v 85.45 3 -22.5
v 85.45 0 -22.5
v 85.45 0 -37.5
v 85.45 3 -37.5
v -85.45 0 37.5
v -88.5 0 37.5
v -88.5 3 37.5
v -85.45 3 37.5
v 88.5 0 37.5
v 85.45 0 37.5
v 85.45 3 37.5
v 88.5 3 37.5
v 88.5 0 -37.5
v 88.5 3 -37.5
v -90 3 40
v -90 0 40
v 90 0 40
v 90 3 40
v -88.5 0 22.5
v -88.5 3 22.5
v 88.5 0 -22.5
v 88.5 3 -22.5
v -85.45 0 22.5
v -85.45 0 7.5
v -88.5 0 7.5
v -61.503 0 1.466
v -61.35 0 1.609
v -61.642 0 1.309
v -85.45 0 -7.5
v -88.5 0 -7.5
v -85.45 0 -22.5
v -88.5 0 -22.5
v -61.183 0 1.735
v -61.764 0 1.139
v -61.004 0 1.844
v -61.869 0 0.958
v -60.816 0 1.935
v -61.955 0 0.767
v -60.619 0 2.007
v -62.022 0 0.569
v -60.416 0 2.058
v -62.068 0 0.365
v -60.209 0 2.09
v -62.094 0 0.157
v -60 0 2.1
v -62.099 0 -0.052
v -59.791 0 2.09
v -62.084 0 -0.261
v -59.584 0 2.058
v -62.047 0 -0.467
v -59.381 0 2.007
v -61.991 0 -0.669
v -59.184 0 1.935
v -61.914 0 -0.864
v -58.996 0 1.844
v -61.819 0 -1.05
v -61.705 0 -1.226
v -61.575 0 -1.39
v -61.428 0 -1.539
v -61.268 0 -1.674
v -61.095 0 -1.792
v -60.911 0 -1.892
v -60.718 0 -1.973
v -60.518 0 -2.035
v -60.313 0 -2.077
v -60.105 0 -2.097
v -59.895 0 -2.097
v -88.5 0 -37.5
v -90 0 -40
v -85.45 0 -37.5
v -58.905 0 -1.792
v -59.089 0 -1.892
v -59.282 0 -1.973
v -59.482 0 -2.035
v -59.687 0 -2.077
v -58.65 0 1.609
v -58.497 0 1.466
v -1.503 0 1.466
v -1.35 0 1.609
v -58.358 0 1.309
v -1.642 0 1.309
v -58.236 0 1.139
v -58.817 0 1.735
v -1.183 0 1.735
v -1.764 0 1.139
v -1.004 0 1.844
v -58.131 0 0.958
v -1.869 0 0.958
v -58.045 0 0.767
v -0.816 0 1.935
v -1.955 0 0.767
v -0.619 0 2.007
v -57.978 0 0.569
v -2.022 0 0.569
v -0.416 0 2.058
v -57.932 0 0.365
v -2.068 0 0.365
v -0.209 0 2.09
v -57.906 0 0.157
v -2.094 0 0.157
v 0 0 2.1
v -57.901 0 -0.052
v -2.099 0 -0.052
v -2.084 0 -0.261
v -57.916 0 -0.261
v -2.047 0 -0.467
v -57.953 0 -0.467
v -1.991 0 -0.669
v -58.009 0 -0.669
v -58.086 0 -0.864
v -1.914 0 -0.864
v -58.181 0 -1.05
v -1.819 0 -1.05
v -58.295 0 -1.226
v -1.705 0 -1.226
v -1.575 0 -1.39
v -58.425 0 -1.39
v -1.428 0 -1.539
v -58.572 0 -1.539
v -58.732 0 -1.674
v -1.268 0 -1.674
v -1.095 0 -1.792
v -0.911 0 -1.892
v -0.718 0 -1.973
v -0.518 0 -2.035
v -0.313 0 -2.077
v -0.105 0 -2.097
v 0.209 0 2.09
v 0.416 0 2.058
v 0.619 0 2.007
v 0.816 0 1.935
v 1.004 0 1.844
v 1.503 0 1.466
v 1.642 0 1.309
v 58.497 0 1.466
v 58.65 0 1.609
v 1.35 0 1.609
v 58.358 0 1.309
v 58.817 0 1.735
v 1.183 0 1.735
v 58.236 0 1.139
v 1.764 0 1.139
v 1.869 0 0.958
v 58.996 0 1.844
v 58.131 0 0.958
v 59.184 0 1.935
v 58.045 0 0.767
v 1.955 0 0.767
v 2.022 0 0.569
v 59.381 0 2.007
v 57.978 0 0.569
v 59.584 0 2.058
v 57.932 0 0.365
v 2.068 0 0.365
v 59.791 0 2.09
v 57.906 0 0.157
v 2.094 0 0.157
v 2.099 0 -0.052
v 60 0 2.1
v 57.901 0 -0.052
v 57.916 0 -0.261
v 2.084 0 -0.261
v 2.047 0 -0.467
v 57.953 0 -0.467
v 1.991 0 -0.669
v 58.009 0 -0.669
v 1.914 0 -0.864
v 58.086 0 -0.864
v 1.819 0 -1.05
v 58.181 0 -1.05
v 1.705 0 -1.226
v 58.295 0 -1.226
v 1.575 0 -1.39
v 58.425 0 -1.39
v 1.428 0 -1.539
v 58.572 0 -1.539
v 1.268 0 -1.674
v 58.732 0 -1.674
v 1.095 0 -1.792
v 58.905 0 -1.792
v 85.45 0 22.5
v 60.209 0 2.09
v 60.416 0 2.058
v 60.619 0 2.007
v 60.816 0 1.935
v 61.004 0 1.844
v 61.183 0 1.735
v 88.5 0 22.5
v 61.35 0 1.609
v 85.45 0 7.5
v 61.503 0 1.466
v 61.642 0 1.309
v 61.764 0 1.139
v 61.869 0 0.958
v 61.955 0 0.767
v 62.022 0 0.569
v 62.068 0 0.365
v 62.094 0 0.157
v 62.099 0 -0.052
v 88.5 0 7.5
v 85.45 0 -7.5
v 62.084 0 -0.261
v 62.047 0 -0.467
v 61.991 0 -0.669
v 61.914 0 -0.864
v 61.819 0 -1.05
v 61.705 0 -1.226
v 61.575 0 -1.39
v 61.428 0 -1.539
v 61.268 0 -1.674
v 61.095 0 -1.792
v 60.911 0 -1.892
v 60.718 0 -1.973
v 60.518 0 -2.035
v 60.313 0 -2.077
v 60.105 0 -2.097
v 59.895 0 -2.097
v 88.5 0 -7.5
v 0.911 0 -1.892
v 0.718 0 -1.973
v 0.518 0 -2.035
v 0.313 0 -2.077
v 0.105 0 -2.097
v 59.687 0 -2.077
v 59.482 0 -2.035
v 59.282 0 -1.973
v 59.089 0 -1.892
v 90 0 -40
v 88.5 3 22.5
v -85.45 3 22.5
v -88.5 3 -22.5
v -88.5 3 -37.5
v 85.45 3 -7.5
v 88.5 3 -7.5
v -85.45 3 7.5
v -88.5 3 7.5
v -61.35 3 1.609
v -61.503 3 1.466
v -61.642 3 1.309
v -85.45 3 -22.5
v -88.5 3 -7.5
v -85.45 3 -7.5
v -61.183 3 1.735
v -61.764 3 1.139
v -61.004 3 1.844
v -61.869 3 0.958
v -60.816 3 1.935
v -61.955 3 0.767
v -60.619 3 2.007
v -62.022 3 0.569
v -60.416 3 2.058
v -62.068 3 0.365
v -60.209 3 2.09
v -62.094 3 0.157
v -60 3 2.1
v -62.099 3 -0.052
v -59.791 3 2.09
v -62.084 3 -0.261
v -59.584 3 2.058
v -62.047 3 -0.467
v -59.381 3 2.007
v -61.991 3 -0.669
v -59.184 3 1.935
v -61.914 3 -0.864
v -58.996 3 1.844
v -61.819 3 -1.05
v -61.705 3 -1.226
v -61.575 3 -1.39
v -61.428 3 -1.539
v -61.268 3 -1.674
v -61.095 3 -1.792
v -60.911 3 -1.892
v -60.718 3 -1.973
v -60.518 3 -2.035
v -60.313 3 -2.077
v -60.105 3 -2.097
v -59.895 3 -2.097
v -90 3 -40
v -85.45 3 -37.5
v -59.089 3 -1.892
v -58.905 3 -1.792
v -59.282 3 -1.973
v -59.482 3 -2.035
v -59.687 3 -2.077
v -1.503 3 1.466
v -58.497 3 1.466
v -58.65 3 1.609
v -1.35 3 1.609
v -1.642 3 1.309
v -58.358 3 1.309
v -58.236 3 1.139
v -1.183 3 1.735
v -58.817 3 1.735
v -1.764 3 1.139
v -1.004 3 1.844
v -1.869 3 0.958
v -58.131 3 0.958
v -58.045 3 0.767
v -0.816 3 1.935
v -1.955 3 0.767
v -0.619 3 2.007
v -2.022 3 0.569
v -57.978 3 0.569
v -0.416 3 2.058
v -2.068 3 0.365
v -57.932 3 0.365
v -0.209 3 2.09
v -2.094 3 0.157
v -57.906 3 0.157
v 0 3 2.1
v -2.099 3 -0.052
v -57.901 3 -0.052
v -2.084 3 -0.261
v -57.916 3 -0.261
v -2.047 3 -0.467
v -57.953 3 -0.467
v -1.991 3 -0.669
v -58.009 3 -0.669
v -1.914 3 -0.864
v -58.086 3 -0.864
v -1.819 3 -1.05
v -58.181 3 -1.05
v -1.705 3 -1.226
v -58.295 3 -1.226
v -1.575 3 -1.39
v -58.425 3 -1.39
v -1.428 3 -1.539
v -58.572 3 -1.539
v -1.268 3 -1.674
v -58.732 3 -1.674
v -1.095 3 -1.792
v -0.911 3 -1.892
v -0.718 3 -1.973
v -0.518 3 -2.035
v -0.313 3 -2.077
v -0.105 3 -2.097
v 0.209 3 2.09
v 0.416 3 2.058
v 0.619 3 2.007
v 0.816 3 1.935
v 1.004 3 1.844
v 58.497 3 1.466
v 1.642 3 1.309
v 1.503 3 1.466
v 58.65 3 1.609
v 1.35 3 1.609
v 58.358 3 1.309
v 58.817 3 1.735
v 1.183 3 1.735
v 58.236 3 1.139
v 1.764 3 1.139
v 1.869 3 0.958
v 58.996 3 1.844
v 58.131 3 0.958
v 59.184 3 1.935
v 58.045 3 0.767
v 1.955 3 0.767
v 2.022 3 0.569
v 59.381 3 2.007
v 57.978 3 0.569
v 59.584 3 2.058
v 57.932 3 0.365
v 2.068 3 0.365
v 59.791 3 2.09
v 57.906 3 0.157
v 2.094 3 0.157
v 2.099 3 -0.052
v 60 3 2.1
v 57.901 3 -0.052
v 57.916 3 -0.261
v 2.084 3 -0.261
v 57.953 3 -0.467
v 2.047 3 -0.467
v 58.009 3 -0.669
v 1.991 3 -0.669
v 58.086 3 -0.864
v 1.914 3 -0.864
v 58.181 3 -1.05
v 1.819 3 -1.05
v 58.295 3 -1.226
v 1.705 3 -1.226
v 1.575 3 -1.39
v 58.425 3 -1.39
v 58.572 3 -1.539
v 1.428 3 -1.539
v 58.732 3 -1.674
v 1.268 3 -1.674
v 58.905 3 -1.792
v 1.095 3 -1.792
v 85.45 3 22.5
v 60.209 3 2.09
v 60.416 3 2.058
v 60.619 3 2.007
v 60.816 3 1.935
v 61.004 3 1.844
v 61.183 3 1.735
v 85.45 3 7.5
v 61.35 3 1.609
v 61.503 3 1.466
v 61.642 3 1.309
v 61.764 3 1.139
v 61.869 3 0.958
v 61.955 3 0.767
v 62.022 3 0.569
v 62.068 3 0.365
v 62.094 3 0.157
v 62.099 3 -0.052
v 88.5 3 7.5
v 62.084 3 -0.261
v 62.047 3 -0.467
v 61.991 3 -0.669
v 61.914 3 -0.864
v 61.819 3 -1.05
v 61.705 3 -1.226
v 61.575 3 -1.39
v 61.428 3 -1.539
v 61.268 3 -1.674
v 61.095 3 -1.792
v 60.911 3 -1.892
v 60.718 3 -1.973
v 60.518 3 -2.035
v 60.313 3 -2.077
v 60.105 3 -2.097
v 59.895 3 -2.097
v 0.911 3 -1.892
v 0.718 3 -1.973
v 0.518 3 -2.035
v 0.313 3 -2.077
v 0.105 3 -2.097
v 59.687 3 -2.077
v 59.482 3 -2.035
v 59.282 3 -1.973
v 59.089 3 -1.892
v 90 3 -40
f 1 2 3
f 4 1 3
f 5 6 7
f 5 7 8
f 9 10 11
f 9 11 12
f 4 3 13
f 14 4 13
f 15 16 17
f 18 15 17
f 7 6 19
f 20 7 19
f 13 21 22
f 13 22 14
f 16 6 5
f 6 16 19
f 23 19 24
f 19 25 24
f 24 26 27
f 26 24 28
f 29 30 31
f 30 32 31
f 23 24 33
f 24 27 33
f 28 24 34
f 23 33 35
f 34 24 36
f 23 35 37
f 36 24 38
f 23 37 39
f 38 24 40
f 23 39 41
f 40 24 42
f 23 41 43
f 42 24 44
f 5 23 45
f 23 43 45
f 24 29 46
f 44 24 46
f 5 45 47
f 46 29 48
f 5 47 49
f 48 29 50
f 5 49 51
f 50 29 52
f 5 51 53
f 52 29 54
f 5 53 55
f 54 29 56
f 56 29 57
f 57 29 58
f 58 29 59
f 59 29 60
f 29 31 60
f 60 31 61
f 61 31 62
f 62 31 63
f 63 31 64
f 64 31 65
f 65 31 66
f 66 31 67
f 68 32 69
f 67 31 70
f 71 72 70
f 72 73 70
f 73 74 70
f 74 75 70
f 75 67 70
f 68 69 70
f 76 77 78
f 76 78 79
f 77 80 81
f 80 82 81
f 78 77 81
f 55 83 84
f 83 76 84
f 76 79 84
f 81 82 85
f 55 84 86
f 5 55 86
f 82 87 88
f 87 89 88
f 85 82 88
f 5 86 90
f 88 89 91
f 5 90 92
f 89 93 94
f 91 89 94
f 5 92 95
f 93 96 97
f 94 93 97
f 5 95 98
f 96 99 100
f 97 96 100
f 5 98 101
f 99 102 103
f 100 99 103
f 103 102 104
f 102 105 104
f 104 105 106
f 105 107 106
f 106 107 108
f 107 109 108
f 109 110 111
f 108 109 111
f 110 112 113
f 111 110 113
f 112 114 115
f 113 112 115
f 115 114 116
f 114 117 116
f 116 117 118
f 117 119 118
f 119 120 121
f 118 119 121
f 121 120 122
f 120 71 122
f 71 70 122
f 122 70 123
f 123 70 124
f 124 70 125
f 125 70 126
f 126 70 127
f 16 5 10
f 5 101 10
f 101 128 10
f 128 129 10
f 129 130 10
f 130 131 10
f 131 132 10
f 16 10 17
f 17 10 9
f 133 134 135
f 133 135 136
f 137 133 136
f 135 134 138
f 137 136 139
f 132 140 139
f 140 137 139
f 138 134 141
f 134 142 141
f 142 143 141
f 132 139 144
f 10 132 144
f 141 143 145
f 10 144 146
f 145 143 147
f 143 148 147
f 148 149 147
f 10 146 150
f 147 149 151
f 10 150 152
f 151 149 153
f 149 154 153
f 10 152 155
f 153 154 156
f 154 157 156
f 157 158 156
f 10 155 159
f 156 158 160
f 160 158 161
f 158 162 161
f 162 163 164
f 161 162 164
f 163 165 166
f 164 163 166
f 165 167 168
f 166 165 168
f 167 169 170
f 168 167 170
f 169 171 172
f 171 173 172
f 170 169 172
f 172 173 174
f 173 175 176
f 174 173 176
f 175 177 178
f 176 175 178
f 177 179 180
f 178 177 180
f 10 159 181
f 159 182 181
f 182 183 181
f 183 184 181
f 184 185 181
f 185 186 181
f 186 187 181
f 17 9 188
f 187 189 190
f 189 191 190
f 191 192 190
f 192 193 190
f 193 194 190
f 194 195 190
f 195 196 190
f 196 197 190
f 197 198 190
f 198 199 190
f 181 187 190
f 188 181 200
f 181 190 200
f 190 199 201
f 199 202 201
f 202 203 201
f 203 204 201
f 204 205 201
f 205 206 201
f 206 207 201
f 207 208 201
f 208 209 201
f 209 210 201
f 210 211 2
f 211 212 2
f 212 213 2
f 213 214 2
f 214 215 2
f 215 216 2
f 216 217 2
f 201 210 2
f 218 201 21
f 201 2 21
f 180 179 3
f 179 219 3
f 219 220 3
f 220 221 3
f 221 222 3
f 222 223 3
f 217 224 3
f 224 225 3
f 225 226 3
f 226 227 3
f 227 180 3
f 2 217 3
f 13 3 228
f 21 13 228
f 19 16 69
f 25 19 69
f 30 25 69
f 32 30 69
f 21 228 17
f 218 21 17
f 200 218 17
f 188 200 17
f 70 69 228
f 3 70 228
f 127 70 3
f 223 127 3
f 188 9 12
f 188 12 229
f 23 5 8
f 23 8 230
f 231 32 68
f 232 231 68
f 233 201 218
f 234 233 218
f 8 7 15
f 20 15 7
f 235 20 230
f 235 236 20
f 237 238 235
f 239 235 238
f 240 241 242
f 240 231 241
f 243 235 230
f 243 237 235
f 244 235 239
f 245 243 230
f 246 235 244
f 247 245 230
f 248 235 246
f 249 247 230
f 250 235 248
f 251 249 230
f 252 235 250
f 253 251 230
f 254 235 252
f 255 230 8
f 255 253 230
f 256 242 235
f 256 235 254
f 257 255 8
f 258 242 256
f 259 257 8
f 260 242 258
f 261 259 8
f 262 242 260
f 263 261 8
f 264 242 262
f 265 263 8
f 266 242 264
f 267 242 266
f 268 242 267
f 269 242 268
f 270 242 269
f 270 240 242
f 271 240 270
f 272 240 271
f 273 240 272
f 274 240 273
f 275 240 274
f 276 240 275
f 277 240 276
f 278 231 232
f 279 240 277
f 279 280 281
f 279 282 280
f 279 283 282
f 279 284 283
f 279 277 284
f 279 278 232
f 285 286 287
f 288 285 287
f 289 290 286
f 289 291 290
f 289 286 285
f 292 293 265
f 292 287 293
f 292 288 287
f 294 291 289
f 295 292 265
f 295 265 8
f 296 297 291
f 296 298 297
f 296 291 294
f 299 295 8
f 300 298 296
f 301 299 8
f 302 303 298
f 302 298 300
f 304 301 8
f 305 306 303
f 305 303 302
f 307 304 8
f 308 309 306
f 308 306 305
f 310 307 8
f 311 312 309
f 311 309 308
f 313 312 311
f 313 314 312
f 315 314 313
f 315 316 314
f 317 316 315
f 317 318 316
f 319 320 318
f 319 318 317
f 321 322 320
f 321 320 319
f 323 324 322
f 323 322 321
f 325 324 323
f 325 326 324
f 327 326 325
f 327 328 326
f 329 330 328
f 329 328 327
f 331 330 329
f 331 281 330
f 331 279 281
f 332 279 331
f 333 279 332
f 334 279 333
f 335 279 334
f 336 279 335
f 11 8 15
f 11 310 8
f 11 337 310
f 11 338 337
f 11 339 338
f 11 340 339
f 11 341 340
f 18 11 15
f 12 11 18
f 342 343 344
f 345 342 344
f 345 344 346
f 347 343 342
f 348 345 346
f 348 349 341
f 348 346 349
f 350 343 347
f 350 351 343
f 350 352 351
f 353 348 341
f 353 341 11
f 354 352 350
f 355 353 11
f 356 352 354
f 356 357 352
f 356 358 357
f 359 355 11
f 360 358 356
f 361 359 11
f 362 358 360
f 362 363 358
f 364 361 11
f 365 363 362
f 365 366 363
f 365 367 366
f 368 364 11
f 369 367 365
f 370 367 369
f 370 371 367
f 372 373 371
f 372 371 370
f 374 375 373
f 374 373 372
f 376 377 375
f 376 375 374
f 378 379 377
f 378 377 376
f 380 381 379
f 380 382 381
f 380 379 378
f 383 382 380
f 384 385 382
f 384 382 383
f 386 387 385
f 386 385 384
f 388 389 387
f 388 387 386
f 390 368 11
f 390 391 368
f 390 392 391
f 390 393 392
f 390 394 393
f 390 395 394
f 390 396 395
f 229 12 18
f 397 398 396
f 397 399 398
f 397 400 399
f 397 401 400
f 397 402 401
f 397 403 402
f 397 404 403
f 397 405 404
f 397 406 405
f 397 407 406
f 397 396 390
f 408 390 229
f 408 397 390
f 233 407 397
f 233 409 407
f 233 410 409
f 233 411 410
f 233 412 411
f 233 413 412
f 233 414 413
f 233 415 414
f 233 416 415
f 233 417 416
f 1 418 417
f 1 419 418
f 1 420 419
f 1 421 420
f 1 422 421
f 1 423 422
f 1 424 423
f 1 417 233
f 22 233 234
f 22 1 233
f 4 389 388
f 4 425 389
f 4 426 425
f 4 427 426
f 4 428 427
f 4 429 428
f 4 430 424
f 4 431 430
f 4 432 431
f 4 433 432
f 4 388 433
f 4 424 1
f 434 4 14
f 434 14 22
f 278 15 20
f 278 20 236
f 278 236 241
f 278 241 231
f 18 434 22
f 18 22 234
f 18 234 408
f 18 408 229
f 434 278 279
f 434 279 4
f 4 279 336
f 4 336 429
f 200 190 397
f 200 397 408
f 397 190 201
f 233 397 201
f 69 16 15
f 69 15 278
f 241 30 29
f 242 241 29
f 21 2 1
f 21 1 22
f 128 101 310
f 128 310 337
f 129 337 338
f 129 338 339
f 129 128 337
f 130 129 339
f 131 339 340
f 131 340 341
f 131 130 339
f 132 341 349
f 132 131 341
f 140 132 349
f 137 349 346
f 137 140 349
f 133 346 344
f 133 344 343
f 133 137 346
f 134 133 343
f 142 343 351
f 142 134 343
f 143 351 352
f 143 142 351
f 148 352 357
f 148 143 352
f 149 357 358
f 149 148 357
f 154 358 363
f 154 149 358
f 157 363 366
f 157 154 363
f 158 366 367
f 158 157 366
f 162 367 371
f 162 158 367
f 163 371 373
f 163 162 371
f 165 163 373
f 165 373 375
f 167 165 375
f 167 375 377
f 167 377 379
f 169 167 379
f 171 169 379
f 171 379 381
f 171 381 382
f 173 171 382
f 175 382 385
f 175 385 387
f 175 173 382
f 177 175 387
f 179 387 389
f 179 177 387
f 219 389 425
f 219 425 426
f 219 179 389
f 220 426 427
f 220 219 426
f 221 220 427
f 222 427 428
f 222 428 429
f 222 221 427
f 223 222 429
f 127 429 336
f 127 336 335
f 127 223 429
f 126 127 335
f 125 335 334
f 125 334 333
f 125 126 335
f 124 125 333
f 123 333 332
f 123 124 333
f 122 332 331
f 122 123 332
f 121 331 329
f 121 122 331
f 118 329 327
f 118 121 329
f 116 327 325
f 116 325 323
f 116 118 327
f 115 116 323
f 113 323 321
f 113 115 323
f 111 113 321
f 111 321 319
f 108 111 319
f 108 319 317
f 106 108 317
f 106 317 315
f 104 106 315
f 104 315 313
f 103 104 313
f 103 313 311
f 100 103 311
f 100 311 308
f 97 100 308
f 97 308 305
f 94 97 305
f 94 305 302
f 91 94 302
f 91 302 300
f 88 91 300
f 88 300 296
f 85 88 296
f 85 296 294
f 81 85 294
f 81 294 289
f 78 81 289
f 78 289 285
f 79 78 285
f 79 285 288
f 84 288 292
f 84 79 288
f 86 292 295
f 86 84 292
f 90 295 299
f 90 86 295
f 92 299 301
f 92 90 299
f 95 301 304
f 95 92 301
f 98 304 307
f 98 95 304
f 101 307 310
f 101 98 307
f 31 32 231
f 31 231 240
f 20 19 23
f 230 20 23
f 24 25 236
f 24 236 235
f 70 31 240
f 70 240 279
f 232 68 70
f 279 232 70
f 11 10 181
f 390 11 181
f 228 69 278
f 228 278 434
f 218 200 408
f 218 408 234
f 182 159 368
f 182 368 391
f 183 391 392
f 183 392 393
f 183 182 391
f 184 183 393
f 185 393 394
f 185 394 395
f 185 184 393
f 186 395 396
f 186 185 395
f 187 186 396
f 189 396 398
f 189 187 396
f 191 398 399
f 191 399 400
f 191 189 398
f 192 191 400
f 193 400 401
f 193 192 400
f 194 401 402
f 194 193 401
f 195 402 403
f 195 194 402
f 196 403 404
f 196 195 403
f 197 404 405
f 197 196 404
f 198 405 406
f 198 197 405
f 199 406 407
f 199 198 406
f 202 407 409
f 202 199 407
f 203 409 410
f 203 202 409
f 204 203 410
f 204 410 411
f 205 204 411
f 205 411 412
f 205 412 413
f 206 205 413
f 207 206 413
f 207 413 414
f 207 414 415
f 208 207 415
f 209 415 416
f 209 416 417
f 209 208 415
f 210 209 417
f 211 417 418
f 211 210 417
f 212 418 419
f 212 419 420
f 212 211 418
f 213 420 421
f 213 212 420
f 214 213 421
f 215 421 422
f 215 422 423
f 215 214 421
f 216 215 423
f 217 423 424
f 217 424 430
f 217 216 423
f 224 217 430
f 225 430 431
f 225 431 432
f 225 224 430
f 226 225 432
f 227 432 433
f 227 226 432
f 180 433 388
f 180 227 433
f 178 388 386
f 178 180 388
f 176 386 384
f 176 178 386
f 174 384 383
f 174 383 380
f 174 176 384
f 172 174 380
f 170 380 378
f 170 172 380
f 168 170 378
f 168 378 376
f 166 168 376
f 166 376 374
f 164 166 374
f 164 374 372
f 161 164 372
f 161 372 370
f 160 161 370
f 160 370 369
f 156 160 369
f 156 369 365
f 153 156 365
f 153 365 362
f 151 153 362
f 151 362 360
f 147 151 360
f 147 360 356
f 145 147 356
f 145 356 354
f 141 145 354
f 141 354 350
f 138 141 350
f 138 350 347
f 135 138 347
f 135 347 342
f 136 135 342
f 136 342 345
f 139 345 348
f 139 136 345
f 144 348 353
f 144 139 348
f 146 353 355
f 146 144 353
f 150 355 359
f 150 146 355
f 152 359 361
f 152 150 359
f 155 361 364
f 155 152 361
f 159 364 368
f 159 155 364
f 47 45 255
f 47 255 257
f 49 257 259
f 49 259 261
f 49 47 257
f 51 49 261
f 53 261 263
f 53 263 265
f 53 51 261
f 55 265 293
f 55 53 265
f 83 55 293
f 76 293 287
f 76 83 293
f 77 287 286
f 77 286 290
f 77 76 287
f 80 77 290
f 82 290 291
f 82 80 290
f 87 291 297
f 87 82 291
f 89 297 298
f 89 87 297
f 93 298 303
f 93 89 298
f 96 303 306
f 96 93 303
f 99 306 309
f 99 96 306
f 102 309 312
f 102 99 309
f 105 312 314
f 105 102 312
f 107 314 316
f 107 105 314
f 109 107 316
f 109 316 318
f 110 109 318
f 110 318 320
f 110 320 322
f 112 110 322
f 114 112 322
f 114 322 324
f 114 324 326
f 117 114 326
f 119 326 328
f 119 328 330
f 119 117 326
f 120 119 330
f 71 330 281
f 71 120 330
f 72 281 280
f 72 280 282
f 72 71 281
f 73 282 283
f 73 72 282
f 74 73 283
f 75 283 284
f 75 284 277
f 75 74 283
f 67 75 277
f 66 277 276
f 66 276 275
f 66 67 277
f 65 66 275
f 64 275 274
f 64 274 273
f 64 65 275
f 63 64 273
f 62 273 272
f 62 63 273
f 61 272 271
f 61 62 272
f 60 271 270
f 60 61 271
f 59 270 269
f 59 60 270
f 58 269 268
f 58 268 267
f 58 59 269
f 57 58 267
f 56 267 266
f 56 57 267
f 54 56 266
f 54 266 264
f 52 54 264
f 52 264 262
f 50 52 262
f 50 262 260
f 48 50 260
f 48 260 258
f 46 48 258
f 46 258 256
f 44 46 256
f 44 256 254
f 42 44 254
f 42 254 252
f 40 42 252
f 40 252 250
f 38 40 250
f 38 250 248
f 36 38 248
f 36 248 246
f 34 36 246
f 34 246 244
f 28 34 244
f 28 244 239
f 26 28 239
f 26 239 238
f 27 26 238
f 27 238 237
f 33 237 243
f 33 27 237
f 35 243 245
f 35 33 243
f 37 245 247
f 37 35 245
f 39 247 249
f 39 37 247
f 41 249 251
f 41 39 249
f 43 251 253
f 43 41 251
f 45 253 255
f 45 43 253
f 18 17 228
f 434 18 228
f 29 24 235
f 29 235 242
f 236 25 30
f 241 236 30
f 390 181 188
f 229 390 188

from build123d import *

# Parameters (mm, degrees)
SKETCH_1_W      = 180
SKETCH_1_H      = 80
SKETCH_1_R      = 2.1
SKETCH_1_W_2    = 3.05
SKETCH_1_H_2    = 15
EXTRUDE_1_DEPTH = 3


with BuildPart() as part:
    # 草图1 → 凸台-拉伸1 (new body)
    with BuildSketch(Plane(origin=(0, 0, 0), x_dir=(1, 0, 0), z_dir=(0, 1, 0))):
        Rectangle(SKETCH_1_W, SKETCH_1_H)
        with Locations(Location((-60, 0, 0), (0, 0, 270))):
            Circle(SKETCH_1_R, mode=Mode.SUBTRACT)
        with Locations(Location((0, 0, 0), (0, 0, 270))):
            Circle(SKETCH_1_R, mode=Mode.SUBTRACT)
        with Locations(Location((60, 0, 0), (0, 0, 270))):
            Circle(SKETCH_1_R, mode=Mode.SUBTRACT)
        with Locations((-86.975, 30)):
            Rectangle(SKETCH_1_W_2, SKETCH_1_H_2, mode=Mode.SUBTRACT)
        with Locations((-86.975, 0)):
            Rectangle(SKETCH_1_W_2, SKETCH_1_H_2, mode=Mode.SUBTRACT)
        with Locations((-86.975, -30)):
            Rectangle(SKETCH_1_W_2, SKETCH_1_H_2, mode=Mode.SUBTRACT)
        with Locations((86.975, 30)):
            Rectangle(SKETCH_1_W_2, SKETCH_1_H_2, mode=Mode.SUBTRACT)
        with Locations((86.975, -30)):
            Rectangle(SKETCH_1_W_2, SKETCH_1_H_2, mode=Mode.SUBTRACT)
        with Locations((86.975, 0)):
            Rectangle(SKETCH_1_W_2, SKETCH_1_H_2, mode=Mode.SUBTRACT)
    extrude(amount=EXTRUDE_1_DEPTH)


solid = part.part
